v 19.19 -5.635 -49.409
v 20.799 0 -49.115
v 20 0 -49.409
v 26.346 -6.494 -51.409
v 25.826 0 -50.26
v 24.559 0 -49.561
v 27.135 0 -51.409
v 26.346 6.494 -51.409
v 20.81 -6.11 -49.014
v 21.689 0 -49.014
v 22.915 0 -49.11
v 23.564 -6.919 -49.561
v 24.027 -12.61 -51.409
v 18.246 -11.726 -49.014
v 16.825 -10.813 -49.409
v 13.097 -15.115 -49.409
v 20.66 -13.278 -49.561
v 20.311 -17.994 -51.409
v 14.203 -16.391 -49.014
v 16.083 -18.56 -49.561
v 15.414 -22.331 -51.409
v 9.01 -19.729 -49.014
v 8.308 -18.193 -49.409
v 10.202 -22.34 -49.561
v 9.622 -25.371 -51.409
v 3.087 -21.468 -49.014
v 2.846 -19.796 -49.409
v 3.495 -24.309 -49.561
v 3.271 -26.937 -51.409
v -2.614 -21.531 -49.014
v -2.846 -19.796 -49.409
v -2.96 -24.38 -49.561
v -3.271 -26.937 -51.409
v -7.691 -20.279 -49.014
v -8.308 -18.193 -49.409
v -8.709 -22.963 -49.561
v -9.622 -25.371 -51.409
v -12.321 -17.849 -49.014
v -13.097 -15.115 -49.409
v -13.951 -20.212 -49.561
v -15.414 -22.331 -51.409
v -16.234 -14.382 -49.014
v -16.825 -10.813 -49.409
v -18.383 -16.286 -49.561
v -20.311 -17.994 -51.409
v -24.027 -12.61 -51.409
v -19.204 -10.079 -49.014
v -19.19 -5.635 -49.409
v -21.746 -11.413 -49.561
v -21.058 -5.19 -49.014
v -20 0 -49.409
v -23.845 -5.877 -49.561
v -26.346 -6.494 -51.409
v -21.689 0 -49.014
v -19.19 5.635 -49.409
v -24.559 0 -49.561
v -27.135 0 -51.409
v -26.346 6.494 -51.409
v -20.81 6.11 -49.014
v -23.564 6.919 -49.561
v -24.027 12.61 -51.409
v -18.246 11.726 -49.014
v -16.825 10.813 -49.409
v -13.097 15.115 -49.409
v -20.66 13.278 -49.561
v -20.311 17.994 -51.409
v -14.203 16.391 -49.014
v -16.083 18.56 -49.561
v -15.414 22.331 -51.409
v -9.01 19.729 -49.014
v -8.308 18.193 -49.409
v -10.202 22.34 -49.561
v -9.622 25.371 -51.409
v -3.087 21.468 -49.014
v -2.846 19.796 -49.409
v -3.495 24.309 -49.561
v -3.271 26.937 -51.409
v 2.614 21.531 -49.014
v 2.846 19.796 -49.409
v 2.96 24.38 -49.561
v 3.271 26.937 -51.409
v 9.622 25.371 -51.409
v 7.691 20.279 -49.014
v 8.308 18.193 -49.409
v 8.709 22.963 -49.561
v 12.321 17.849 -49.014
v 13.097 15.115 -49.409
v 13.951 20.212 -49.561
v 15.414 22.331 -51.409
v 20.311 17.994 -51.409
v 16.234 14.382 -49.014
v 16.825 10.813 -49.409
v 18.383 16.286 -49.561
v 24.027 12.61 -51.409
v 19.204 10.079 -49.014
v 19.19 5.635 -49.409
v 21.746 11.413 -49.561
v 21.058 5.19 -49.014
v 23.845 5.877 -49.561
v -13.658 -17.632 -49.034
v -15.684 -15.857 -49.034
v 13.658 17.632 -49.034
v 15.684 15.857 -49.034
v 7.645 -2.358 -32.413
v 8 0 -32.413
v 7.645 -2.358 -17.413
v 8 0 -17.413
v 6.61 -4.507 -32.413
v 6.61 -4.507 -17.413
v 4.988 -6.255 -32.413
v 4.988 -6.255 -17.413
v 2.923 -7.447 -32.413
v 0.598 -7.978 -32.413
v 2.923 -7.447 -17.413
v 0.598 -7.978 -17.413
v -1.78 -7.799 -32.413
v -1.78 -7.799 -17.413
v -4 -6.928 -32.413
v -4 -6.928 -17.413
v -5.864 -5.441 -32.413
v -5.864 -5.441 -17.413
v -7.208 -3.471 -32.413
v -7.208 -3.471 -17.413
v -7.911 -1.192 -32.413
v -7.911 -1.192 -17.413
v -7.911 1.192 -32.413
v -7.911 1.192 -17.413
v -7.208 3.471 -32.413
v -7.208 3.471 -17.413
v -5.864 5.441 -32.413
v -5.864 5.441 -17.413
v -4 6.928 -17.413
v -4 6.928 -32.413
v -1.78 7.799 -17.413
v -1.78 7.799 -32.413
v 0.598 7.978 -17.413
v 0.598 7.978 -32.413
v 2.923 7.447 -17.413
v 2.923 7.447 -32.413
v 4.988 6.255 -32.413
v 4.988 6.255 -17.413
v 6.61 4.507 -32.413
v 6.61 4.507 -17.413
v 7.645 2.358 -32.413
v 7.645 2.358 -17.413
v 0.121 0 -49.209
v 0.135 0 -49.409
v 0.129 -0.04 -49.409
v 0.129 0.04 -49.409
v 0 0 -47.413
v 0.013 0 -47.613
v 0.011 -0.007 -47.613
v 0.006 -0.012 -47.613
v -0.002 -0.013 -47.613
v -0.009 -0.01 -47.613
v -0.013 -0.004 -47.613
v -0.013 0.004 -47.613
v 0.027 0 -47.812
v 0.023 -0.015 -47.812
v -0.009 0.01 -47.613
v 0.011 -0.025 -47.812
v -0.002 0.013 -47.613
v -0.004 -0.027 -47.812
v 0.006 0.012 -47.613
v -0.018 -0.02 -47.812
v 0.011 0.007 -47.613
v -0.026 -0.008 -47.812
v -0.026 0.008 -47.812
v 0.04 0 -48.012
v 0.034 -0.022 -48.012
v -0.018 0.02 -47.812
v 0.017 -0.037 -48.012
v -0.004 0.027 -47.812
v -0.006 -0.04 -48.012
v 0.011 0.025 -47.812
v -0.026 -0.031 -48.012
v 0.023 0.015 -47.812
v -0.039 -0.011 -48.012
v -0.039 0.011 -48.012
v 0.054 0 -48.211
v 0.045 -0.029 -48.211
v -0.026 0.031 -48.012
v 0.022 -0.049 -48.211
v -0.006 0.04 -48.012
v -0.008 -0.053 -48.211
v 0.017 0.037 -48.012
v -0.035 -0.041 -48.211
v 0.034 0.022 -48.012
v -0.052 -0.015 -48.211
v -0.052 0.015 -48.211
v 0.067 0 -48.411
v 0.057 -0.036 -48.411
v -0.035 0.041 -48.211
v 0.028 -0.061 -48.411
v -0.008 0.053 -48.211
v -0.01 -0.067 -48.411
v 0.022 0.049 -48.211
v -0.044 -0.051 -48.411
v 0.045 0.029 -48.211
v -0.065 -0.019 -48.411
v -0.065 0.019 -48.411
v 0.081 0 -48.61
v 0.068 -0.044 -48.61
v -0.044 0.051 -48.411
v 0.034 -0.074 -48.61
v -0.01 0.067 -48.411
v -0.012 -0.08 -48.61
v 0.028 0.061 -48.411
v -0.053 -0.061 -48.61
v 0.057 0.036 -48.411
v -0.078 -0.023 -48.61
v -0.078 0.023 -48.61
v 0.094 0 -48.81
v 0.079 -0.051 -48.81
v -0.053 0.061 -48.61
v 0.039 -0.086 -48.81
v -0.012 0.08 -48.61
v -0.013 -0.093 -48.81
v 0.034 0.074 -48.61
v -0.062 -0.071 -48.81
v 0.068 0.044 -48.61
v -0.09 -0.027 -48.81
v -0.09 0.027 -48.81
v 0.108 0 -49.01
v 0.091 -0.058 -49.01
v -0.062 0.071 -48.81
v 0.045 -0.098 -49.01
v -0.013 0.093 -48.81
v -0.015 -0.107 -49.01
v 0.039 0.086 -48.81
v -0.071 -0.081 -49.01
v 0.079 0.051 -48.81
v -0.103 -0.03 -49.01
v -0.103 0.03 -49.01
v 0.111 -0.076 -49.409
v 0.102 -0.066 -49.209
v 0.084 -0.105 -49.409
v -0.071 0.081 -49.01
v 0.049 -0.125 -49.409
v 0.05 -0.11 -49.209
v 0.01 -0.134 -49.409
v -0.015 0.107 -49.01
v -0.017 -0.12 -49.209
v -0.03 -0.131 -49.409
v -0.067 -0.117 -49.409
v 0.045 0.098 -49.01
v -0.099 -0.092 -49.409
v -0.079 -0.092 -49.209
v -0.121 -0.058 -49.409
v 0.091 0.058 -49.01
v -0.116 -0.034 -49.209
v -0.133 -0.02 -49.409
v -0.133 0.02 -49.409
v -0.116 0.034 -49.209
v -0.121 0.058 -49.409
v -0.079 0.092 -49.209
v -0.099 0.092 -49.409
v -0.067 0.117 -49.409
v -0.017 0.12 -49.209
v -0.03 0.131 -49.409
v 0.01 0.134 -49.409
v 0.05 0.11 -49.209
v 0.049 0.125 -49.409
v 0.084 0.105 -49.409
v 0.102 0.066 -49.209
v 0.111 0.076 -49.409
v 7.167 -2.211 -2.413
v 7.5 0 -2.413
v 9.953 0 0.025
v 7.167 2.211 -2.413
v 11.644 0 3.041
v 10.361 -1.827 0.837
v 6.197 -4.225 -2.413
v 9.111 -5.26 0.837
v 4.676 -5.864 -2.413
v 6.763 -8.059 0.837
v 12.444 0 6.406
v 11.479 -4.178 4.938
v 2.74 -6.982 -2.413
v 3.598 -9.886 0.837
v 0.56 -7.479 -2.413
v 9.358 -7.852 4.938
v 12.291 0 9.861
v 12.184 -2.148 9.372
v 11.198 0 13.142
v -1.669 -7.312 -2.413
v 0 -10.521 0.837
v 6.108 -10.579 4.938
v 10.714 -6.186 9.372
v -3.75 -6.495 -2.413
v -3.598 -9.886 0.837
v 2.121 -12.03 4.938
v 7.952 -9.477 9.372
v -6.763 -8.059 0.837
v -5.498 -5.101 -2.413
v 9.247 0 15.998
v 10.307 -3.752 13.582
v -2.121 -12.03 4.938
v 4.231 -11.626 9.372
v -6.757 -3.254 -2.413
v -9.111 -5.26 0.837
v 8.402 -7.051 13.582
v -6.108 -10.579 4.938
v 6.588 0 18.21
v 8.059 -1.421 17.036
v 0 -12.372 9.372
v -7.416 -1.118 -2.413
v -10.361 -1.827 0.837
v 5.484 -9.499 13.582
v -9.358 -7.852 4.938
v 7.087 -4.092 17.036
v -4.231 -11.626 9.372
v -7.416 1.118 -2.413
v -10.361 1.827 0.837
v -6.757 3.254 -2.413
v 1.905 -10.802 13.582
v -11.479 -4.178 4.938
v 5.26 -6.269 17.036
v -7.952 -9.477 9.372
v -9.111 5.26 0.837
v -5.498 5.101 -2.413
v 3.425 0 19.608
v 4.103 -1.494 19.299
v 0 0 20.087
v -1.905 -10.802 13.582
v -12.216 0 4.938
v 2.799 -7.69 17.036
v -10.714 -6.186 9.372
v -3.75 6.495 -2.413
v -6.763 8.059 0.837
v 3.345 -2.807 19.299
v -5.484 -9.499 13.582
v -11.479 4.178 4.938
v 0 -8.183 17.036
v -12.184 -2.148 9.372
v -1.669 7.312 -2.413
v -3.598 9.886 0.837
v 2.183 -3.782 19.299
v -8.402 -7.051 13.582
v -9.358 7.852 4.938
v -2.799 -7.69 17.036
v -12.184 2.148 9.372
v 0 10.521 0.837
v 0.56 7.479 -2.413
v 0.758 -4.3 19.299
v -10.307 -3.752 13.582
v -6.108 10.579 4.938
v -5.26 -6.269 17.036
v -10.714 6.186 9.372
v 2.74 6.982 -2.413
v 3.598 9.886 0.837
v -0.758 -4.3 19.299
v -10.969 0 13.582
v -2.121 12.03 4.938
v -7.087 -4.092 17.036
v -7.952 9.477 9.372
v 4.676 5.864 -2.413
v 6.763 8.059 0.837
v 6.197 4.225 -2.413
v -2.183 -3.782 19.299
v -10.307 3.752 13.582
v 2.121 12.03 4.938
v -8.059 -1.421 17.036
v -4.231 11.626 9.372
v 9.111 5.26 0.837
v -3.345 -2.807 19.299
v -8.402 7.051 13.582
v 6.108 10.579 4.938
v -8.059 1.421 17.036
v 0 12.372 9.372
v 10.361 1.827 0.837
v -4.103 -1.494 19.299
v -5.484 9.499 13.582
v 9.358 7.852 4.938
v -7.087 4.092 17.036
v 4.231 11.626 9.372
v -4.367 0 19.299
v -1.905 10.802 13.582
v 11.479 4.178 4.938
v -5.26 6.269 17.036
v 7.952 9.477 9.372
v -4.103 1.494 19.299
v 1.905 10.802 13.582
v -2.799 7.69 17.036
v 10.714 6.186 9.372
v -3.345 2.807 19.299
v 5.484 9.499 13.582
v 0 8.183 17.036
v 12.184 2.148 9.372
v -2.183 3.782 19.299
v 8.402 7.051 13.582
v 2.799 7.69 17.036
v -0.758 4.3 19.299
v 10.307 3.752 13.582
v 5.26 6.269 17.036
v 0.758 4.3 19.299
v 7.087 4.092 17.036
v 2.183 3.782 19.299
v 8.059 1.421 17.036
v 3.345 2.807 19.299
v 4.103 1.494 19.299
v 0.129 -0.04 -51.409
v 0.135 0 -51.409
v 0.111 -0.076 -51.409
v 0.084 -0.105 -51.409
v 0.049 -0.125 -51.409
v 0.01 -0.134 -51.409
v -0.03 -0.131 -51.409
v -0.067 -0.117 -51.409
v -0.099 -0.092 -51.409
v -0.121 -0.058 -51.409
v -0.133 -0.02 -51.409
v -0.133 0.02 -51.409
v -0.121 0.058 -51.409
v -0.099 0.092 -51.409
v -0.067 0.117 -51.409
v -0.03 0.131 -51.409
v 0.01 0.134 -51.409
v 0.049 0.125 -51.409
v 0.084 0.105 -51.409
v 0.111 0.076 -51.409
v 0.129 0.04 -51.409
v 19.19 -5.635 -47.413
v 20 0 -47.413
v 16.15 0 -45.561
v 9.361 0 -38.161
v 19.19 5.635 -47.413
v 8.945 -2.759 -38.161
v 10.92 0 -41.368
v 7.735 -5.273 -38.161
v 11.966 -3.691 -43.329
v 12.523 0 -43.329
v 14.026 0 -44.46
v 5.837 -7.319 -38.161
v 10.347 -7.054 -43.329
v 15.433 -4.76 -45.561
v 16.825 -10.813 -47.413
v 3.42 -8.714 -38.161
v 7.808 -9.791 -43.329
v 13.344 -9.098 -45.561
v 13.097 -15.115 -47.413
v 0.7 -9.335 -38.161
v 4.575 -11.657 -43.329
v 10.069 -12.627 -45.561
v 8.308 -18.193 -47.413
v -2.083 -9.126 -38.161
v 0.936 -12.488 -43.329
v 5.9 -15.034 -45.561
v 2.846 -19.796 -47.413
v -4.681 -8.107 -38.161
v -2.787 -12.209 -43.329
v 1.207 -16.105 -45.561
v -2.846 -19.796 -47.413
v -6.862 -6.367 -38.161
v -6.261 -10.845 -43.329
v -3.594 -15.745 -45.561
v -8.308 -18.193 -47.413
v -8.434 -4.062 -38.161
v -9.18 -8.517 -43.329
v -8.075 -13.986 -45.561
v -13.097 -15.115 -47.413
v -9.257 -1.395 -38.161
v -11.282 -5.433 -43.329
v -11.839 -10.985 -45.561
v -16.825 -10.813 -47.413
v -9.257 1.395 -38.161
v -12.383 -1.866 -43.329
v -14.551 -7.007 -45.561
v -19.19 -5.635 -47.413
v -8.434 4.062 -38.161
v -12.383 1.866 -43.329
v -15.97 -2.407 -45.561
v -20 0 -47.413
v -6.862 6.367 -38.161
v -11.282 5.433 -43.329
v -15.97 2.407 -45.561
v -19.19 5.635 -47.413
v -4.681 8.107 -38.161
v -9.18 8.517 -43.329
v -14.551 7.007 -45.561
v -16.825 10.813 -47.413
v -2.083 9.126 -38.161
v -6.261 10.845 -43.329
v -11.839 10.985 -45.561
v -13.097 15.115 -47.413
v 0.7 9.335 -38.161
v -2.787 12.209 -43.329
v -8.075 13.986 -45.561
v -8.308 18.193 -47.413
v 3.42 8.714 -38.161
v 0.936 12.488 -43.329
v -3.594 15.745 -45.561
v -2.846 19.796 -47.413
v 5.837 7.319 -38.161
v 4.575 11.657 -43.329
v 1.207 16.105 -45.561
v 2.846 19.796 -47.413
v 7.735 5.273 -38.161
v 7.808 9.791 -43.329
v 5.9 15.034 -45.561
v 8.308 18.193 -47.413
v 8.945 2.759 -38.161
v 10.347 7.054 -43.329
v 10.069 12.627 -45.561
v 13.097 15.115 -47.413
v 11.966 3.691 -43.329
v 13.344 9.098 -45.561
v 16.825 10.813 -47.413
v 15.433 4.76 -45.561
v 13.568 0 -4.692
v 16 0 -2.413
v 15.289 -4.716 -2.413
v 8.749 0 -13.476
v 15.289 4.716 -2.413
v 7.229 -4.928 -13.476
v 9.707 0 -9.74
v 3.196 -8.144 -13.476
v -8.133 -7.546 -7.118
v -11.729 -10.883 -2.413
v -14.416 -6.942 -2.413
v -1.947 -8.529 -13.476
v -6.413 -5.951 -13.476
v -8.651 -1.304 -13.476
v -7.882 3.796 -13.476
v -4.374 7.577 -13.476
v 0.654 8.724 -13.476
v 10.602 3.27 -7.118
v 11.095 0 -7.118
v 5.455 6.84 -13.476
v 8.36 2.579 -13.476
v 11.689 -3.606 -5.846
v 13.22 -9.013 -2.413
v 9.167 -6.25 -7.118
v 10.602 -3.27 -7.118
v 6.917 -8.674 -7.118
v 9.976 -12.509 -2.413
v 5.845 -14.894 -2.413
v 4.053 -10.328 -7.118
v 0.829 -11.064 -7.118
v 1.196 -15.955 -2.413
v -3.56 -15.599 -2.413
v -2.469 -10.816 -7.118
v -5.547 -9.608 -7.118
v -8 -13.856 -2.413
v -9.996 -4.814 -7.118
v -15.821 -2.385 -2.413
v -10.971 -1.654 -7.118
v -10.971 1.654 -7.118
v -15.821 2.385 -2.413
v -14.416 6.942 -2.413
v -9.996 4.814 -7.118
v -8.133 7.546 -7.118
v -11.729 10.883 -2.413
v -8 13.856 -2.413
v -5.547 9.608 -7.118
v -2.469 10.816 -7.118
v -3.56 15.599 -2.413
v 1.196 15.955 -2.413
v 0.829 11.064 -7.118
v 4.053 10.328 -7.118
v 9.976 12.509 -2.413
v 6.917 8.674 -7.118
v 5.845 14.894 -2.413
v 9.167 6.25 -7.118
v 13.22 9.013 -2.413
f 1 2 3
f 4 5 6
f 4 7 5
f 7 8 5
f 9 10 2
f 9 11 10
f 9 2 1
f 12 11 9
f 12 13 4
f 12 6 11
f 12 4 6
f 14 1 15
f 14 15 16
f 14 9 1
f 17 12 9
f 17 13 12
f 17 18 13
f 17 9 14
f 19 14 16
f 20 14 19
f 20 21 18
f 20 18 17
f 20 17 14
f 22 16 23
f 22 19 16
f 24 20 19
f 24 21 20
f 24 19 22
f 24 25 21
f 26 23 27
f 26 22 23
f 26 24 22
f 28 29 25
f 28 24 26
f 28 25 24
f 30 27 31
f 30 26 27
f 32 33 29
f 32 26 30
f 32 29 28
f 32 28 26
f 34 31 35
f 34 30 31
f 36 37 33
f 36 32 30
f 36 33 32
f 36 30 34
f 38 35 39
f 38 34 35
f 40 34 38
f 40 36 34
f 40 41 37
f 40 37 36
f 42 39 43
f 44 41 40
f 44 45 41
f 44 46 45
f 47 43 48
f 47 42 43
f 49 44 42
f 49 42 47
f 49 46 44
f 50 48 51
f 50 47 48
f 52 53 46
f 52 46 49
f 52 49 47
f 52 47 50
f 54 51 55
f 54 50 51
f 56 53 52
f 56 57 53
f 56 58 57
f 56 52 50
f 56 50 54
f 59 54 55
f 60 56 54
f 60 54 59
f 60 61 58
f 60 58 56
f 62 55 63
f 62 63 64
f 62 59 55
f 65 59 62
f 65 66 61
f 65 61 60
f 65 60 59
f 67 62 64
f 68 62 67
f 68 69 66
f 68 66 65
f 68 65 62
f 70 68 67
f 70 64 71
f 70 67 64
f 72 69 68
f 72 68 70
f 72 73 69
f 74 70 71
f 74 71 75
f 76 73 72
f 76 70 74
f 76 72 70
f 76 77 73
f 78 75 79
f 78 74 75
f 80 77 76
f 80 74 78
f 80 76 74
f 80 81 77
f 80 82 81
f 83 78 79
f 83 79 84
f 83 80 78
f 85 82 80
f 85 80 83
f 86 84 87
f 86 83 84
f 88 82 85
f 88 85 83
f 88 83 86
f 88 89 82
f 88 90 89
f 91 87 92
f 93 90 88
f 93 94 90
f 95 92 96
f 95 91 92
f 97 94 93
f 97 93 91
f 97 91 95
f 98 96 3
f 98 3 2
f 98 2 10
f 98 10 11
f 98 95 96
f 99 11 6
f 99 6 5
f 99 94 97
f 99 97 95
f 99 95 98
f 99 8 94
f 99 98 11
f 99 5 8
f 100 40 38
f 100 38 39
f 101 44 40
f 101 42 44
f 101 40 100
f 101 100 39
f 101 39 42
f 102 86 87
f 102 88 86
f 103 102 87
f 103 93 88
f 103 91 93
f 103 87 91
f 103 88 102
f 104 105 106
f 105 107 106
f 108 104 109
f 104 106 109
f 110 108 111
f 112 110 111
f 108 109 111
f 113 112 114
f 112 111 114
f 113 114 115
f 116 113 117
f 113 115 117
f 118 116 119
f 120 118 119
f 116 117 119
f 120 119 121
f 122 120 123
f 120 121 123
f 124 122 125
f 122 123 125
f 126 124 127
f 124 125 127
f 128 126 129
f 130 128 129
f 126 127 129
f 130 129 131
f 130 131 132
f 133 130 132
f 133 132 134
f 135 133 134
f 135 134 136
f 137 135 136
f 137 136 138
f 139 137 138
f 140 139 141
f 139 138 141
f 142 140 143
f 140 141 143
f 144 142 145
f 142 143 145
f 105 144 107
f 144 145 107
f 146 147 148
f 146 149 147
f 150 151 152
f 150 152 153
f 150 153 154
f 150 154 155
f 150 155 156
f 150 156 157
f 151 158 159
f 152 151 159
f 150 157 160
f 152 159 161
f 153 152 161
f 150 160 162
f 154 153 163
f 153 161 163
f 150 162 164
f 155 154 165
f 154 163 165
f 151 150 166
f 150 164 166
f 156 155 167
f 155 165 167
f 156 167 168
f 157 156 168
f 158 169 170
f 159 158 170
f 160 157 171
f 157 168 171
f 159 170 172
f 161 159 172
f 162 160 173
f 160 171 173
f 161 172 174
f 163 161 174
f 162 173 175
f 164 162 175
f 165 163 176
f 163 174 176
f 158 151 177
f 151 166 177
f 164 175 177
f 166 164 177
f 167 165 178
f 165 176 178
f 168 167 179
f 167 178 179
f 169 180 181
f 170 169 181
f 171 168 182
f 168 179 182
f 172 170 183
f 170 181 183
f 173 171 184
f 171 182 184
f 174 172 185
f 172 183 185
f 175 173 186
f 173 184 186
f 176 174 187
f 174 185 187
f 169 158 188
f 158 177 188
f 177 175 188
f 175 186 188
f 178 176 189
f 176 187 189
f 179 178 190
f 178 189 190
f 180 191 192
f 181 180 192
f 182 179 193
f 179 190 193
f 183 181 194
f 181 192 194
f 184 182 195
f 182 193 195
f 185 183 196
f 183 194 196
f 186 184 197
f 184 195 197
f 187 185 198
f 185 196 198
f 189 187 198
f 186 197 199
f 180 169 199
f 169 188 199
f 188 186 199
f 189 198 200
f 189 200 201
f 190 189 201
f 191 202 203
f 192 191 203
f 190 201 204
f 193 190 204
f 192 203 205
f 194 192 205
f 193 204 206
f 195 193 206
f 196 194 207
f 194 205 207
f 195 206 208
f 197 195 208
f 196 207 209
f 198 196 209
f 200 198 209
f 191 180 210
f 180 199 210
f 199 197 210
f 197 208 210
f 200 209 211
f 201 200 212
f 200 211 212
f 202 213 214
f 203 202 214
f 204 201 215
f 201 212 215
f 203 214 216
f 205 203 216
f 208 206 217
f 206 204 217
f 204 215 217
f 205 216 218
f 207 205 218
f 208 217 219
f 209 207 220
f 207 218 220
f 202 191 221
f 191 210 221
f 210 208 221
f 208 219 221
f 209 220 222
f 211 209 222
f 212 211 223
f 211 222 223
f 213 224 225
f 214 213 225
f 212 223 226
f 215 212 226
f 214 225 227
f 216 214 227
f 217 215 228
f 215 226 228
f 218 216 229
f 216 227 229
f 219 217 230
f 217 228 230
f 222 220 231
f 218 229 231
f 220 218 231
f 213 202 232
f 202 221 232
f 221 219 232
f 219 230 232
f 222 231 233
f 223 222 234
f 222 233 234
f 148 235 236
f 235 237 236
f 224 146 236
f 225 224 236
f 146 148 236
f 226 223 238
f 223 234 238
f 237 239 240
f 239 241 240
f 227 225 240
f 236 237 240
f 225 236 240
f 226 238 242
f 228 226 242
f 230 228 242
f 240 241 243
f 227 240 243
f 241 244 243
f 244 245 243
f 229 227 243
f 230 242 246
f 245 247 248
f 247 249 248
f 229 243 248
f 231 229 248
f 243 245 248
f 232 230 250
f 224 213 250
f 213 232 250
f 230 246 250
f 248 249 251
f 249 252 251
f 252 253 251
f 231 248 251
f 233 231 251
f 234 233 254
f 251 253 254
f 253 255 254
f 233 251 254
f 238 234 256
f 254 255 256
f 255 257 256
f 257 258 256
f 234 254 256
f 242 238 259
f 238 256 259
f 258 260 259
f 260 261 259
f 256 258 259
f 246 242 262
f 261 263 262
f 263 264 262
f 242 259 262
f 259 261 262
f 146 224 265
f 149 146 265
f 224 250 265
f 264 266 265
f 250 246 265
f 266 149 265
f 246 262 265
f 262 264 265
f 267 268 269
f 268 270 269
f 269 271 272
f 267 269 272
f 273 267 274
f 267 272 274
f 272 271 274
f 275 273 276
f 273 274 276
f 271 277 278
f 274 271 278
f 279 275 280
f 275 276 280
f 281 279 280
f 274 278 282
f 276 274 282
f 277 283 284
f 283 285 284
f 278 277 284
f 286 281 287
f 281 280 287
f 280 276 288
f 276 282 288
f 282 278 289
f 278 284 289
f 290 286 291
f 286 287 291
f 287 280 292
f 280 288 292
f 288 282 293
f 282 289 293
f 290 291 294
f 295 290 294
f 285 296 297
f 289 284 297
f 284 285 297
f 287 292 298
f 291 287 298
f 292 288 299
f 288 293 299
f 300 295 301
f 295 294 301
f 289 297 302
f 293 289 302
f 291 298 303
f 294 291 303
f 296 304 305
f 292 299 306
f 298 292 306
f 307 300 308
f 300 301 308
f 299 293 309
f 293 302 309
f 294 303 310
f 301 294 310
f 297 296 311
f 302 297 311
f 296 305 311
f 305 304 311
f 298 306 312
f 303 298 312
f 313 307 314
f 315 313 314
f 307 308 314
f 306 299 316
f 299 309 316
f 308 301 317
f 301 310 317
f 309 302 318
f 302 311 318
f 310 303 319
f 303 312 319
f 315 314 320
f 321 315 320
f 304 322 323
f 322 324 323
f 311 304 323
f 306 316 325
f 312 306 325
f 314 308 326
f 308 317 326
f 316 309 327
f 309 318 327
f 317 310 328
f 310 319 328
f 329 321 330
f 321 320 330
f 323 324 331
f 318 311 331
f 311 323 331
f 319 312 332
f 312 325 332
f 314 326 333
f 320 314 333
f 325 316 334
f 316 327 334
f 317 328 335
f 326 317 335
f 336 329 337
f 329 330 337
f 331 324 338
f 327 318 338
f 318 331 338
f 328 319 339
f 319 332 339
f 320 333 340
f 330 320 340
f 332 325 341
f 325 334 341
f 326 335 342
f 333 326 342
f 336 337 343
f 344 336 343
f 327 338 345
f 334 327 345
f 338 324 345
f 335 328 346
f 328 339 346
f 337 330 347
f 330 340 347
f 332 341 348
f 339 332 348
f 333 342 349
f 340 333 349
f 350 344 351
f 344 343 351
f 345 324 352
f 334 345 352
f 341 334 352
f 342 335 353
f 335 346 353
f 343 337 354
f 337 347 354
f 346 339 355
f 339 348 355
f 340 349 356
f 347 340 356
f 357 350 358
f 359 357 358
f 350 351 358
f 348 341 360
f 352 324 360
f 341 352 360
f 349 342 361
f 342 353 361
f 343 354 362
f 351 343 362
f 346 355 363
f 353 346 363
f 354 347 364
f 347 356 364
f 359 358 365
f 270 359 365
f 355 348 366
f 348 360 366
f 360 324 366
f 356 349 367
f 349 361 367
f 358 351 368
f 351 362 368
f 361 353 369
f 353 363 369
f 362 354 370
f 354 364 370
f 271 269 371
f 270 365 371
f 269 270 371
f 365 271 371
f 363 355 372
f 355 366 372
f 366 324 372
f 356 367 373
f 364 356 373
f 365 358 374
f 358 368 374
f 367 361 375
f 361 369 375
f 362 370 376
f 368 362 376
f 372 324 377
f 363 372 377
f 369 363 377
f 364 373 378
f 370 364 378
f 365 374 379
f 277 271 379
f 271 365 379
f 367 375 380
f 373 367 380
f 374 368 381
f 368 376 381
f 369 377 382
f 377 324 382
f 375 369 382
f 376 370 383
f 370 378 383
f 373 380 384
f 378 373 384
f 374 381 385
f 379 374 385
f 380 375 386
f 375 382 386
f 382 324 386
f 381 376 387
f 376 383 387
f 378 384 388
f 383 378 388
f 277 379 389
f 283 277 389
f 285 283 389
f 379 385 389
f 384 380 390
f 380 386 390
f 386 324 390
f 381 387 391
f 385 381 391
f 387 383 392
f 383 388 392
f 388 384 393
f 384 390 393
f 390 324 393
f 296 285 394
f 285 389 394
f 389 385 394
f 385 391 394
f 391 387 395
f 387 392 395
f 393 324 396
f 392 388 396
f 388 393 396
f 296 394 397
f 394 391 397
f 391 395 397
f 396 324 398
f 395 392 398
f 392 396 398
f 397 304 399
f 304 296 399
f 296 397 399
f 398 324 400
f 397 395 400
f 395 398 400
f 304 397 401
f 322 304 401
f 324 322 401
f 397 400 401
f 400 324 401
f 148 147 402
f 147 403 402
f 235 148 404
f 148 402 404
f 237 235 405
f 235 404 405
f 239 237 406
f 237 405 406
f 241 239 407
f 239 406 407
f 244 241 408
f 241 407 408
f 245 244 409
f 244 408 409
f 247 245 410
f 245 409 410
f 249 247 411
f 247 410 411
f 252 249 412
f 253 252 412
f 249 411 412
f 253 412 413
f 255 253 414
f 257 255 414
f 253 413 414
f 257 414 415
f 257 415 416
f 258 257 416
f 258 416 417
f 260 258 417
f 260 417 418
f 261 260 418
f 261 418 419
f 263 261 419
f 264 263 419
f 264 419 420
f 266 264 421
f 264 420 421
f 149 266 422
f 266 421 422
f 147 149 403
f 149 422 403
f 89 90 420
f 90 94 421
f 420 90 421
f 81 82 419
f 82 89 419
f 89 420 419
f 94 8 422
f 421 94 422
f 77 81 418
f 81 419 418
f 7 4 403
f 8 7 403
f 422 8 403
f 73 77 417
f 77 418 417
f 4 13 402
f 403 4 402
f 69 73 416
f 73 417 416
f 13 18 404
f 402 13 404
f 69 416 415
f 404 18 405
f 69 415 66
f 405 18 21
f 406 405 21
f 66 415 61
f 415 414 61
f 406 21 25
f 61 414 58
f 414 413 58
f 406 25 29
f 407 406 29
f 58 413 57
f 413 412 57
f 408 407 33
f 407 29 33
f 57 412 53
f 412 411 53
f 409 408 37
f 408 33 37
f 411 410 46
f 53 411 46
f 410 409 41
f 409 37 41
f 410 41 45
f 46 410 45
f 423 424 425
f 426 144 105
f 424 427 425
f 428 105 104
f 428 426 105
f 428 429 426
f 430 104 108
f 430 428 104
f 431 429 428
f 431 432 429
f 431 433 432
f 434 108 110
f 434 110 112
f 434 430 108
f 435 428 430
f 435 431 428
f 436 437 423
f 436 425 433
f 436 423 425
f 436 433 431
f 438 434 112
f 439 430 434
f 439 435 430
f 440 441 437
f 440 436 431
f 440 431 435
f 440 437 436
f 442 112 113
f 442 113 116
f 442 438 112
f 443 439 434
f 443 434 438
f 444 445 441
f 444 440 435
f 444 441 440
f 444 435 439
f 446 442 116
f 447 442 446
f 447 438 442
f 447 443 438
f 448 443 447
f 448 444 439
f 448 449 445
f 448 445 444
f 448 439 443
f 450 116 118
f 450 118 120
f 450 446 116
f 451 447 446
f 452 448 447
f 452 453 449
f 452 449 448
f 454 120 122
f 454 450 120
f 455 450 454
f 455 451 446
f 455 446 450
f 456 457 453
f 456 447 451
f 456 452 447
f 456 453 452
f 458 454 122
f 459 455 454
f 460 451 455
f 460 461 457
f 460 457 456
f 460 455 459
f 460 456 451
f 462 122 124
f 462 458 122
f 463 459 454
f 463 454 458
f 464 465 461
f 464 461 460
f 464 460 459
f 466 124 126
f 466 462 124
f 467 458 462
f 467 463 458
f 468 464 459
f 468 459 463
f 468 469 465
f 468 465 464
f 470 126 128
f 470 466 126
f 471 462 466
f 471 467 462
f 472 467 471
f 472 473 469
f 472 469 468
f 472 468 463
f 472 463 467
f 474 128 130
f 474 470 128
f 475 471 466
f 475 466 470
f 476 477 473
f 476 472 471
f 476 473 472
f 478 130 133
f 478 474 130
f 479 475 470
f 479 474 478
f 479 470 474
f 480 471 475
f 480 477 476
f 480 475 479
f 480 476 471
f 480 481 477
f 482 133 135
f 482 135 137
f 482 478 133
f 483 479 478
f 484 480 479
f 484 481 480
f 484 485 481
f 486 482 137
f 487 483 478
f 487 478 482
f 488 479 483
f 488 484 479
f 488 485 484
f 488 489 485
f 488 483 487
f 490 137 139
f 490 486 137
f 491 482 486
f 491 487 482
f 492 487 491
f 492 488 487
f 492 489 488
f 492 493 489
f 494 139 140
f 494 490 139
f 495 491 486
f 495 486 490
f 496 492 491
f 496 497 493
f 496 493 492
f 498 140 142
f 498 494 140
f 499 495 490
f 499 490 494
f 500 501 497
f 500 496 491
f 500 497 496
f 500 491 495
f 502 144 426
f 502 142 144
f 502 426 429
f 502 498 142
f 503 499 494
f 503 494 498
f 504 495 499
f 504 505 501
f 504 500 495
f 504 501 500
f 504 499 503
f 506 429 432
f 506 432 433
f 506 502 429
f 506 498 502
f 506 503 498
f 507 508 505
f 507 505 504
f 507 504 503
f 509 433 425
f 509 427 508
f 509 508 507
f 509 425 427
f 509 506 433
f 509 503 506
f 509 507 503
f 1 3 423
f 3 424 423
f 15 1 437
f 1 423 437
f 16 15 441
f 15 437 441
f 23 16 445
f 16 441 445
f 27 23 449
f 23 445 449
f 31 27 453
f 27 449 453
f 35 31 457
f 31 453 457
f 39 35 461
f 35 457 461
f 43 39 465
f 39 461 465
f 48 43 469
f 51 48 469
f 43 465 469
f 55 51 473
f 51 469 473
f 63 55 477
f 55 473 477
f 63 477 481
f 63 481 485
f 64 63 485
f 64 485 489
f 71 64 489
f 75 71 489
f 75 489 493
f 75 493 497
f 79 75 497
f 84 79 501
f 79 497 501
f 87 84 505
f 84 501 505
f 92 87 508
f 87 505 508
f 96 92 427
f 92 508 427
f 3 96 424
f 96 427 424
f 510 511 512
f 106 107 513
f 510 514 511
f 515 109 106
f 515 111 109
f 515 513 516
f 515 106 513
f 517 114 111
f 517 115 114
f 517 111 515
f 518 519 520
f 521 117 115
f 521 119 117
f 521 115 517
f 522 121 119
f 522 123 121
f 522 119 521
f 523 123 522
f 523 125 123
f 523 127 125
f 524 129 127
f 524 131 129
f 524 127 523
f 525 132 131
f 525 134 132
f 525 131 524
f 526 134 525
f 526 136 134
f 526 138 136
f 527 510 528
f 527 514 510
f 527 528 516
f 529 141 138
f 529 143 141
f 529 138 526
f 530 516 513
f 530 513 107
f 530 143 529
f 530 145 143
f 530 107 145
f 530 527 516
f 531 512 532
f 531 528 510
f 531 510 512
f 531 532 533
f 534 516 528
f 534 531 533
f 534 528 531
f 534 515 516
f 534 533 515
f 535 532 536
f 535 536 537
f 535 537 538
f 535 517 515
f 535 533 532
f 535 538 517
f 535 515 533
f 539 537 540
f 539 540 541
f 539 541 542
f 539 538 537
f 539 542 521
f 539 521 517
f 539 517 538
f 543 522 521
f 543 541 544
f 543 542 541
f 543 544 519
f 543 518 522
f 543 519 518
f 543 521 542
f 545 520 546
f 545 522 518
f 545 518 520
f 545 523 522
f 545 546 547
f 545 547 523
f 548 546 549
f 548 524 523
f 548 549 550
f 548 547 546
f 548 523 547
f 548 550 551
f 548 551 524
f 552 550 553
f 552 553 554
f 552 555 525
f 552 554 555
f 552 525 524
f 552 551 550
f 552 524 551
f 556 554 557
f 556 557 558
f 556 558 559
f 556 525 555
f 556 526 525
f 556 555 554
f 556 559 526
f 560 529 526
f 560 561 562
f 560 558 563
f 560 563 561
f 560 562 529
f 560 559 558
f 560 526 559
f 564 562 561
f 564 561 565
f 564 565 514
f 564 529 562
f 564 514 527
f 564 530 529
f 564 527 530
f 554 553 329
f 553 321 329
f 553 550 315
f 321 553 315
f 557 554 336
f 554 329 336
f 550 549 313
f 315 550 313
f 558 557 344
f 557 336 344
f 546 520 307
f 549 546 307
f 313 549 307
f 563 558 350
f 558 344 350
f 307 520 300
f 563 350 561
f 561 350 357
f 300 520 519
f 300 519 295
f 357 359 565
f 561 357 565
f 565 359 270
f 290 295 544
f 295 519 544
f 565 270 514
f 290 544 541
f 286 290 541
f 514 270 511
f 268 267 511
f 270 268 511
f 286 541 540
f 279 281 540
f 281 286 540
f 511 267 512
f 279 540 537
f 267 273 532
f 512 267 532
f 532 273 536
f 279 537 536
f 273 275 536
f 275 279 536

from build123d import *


# Not quite as in the source:
# - a feature names something its author has since deleted; it is built from what else it names


with BuildPart() as f1:
    # F0 (on Front) → F1 (revolve)
    with BuildSketch(Plane.XZ):
        with BuildLine():
            Line((16, -2.4131433771), (7.5, -2.4131433771))
            ThreePointArc((7.5, -2.4131433771), (11.8585412256, 11.5397036981), (0, 20.0868566229))
            Line((0, 20.0868566229), (0, 7.5868566229))
            Line((0, 7.5868566229), (0, -2.4131433771))
            Line((0, -2.4131433771), (0, -17.4131433771))
            Line((0, -17.4131433771), (0, -32.4131433771))
            Line((0, -32.4131433771), (0, -47.4131433771))
            Line((0, -47.4131433771), (0.1347365081, -49.4085997343))
            Line((0.1347365081, -49.4085997343), (0.1347365081, -51.4085997343))
            Line((0.1347365081, -51.4085997343), (27.1347365081, -51.4085997343))
            add(Edge.make_bspline(
                [(20, -49.4085997343), (21.1647466197, -48.7697309267), (24.5158880863, -49.2280358233), (26.0127596557, -50.3029301763), (27.1347365081, -51.4085997343)],
                knots=[0, 0, 0, 0, 0.5171119301, 1, 1, 1, 1], degree=3))
            Line((20, -49.4085997343), (20, -47.4131433771))
            add(Edge.make_bspline(
                [(8, -32.4131433771), (8.1538179197, -34.0022767405), (8.8353543612, -37.329541577), (12.0621827681, -44.6088268089), (17.7756990209, -46.0672005111), (20, -47.4131433771)],
                knots=[0, 0, 0, 0, 0.2858059908, 0.6339622457, 1, 1, 1, 1], degree=3))
            Line((8, -32.4131433771), (8, -17.4131433771))
            add(Edge.make_bspline(
                [(16, -2.4131433771), (14.9209762915, -3.8251770696), (11.0665886907, -6.0967064809), (8.9117025522, -11.4433176222), (8.4714845406, -15.3714061946), (8, -17.4131433771)],
                knots=[0, 0, 0, 0, 0.3360443888, 0.6607253154, 1, 1, 1, 1], degree=3))
        make_face()
    revolve(axis=Axis((0, 0, 13.8368566229), (0, 0, -1)))


solid = f1.part
